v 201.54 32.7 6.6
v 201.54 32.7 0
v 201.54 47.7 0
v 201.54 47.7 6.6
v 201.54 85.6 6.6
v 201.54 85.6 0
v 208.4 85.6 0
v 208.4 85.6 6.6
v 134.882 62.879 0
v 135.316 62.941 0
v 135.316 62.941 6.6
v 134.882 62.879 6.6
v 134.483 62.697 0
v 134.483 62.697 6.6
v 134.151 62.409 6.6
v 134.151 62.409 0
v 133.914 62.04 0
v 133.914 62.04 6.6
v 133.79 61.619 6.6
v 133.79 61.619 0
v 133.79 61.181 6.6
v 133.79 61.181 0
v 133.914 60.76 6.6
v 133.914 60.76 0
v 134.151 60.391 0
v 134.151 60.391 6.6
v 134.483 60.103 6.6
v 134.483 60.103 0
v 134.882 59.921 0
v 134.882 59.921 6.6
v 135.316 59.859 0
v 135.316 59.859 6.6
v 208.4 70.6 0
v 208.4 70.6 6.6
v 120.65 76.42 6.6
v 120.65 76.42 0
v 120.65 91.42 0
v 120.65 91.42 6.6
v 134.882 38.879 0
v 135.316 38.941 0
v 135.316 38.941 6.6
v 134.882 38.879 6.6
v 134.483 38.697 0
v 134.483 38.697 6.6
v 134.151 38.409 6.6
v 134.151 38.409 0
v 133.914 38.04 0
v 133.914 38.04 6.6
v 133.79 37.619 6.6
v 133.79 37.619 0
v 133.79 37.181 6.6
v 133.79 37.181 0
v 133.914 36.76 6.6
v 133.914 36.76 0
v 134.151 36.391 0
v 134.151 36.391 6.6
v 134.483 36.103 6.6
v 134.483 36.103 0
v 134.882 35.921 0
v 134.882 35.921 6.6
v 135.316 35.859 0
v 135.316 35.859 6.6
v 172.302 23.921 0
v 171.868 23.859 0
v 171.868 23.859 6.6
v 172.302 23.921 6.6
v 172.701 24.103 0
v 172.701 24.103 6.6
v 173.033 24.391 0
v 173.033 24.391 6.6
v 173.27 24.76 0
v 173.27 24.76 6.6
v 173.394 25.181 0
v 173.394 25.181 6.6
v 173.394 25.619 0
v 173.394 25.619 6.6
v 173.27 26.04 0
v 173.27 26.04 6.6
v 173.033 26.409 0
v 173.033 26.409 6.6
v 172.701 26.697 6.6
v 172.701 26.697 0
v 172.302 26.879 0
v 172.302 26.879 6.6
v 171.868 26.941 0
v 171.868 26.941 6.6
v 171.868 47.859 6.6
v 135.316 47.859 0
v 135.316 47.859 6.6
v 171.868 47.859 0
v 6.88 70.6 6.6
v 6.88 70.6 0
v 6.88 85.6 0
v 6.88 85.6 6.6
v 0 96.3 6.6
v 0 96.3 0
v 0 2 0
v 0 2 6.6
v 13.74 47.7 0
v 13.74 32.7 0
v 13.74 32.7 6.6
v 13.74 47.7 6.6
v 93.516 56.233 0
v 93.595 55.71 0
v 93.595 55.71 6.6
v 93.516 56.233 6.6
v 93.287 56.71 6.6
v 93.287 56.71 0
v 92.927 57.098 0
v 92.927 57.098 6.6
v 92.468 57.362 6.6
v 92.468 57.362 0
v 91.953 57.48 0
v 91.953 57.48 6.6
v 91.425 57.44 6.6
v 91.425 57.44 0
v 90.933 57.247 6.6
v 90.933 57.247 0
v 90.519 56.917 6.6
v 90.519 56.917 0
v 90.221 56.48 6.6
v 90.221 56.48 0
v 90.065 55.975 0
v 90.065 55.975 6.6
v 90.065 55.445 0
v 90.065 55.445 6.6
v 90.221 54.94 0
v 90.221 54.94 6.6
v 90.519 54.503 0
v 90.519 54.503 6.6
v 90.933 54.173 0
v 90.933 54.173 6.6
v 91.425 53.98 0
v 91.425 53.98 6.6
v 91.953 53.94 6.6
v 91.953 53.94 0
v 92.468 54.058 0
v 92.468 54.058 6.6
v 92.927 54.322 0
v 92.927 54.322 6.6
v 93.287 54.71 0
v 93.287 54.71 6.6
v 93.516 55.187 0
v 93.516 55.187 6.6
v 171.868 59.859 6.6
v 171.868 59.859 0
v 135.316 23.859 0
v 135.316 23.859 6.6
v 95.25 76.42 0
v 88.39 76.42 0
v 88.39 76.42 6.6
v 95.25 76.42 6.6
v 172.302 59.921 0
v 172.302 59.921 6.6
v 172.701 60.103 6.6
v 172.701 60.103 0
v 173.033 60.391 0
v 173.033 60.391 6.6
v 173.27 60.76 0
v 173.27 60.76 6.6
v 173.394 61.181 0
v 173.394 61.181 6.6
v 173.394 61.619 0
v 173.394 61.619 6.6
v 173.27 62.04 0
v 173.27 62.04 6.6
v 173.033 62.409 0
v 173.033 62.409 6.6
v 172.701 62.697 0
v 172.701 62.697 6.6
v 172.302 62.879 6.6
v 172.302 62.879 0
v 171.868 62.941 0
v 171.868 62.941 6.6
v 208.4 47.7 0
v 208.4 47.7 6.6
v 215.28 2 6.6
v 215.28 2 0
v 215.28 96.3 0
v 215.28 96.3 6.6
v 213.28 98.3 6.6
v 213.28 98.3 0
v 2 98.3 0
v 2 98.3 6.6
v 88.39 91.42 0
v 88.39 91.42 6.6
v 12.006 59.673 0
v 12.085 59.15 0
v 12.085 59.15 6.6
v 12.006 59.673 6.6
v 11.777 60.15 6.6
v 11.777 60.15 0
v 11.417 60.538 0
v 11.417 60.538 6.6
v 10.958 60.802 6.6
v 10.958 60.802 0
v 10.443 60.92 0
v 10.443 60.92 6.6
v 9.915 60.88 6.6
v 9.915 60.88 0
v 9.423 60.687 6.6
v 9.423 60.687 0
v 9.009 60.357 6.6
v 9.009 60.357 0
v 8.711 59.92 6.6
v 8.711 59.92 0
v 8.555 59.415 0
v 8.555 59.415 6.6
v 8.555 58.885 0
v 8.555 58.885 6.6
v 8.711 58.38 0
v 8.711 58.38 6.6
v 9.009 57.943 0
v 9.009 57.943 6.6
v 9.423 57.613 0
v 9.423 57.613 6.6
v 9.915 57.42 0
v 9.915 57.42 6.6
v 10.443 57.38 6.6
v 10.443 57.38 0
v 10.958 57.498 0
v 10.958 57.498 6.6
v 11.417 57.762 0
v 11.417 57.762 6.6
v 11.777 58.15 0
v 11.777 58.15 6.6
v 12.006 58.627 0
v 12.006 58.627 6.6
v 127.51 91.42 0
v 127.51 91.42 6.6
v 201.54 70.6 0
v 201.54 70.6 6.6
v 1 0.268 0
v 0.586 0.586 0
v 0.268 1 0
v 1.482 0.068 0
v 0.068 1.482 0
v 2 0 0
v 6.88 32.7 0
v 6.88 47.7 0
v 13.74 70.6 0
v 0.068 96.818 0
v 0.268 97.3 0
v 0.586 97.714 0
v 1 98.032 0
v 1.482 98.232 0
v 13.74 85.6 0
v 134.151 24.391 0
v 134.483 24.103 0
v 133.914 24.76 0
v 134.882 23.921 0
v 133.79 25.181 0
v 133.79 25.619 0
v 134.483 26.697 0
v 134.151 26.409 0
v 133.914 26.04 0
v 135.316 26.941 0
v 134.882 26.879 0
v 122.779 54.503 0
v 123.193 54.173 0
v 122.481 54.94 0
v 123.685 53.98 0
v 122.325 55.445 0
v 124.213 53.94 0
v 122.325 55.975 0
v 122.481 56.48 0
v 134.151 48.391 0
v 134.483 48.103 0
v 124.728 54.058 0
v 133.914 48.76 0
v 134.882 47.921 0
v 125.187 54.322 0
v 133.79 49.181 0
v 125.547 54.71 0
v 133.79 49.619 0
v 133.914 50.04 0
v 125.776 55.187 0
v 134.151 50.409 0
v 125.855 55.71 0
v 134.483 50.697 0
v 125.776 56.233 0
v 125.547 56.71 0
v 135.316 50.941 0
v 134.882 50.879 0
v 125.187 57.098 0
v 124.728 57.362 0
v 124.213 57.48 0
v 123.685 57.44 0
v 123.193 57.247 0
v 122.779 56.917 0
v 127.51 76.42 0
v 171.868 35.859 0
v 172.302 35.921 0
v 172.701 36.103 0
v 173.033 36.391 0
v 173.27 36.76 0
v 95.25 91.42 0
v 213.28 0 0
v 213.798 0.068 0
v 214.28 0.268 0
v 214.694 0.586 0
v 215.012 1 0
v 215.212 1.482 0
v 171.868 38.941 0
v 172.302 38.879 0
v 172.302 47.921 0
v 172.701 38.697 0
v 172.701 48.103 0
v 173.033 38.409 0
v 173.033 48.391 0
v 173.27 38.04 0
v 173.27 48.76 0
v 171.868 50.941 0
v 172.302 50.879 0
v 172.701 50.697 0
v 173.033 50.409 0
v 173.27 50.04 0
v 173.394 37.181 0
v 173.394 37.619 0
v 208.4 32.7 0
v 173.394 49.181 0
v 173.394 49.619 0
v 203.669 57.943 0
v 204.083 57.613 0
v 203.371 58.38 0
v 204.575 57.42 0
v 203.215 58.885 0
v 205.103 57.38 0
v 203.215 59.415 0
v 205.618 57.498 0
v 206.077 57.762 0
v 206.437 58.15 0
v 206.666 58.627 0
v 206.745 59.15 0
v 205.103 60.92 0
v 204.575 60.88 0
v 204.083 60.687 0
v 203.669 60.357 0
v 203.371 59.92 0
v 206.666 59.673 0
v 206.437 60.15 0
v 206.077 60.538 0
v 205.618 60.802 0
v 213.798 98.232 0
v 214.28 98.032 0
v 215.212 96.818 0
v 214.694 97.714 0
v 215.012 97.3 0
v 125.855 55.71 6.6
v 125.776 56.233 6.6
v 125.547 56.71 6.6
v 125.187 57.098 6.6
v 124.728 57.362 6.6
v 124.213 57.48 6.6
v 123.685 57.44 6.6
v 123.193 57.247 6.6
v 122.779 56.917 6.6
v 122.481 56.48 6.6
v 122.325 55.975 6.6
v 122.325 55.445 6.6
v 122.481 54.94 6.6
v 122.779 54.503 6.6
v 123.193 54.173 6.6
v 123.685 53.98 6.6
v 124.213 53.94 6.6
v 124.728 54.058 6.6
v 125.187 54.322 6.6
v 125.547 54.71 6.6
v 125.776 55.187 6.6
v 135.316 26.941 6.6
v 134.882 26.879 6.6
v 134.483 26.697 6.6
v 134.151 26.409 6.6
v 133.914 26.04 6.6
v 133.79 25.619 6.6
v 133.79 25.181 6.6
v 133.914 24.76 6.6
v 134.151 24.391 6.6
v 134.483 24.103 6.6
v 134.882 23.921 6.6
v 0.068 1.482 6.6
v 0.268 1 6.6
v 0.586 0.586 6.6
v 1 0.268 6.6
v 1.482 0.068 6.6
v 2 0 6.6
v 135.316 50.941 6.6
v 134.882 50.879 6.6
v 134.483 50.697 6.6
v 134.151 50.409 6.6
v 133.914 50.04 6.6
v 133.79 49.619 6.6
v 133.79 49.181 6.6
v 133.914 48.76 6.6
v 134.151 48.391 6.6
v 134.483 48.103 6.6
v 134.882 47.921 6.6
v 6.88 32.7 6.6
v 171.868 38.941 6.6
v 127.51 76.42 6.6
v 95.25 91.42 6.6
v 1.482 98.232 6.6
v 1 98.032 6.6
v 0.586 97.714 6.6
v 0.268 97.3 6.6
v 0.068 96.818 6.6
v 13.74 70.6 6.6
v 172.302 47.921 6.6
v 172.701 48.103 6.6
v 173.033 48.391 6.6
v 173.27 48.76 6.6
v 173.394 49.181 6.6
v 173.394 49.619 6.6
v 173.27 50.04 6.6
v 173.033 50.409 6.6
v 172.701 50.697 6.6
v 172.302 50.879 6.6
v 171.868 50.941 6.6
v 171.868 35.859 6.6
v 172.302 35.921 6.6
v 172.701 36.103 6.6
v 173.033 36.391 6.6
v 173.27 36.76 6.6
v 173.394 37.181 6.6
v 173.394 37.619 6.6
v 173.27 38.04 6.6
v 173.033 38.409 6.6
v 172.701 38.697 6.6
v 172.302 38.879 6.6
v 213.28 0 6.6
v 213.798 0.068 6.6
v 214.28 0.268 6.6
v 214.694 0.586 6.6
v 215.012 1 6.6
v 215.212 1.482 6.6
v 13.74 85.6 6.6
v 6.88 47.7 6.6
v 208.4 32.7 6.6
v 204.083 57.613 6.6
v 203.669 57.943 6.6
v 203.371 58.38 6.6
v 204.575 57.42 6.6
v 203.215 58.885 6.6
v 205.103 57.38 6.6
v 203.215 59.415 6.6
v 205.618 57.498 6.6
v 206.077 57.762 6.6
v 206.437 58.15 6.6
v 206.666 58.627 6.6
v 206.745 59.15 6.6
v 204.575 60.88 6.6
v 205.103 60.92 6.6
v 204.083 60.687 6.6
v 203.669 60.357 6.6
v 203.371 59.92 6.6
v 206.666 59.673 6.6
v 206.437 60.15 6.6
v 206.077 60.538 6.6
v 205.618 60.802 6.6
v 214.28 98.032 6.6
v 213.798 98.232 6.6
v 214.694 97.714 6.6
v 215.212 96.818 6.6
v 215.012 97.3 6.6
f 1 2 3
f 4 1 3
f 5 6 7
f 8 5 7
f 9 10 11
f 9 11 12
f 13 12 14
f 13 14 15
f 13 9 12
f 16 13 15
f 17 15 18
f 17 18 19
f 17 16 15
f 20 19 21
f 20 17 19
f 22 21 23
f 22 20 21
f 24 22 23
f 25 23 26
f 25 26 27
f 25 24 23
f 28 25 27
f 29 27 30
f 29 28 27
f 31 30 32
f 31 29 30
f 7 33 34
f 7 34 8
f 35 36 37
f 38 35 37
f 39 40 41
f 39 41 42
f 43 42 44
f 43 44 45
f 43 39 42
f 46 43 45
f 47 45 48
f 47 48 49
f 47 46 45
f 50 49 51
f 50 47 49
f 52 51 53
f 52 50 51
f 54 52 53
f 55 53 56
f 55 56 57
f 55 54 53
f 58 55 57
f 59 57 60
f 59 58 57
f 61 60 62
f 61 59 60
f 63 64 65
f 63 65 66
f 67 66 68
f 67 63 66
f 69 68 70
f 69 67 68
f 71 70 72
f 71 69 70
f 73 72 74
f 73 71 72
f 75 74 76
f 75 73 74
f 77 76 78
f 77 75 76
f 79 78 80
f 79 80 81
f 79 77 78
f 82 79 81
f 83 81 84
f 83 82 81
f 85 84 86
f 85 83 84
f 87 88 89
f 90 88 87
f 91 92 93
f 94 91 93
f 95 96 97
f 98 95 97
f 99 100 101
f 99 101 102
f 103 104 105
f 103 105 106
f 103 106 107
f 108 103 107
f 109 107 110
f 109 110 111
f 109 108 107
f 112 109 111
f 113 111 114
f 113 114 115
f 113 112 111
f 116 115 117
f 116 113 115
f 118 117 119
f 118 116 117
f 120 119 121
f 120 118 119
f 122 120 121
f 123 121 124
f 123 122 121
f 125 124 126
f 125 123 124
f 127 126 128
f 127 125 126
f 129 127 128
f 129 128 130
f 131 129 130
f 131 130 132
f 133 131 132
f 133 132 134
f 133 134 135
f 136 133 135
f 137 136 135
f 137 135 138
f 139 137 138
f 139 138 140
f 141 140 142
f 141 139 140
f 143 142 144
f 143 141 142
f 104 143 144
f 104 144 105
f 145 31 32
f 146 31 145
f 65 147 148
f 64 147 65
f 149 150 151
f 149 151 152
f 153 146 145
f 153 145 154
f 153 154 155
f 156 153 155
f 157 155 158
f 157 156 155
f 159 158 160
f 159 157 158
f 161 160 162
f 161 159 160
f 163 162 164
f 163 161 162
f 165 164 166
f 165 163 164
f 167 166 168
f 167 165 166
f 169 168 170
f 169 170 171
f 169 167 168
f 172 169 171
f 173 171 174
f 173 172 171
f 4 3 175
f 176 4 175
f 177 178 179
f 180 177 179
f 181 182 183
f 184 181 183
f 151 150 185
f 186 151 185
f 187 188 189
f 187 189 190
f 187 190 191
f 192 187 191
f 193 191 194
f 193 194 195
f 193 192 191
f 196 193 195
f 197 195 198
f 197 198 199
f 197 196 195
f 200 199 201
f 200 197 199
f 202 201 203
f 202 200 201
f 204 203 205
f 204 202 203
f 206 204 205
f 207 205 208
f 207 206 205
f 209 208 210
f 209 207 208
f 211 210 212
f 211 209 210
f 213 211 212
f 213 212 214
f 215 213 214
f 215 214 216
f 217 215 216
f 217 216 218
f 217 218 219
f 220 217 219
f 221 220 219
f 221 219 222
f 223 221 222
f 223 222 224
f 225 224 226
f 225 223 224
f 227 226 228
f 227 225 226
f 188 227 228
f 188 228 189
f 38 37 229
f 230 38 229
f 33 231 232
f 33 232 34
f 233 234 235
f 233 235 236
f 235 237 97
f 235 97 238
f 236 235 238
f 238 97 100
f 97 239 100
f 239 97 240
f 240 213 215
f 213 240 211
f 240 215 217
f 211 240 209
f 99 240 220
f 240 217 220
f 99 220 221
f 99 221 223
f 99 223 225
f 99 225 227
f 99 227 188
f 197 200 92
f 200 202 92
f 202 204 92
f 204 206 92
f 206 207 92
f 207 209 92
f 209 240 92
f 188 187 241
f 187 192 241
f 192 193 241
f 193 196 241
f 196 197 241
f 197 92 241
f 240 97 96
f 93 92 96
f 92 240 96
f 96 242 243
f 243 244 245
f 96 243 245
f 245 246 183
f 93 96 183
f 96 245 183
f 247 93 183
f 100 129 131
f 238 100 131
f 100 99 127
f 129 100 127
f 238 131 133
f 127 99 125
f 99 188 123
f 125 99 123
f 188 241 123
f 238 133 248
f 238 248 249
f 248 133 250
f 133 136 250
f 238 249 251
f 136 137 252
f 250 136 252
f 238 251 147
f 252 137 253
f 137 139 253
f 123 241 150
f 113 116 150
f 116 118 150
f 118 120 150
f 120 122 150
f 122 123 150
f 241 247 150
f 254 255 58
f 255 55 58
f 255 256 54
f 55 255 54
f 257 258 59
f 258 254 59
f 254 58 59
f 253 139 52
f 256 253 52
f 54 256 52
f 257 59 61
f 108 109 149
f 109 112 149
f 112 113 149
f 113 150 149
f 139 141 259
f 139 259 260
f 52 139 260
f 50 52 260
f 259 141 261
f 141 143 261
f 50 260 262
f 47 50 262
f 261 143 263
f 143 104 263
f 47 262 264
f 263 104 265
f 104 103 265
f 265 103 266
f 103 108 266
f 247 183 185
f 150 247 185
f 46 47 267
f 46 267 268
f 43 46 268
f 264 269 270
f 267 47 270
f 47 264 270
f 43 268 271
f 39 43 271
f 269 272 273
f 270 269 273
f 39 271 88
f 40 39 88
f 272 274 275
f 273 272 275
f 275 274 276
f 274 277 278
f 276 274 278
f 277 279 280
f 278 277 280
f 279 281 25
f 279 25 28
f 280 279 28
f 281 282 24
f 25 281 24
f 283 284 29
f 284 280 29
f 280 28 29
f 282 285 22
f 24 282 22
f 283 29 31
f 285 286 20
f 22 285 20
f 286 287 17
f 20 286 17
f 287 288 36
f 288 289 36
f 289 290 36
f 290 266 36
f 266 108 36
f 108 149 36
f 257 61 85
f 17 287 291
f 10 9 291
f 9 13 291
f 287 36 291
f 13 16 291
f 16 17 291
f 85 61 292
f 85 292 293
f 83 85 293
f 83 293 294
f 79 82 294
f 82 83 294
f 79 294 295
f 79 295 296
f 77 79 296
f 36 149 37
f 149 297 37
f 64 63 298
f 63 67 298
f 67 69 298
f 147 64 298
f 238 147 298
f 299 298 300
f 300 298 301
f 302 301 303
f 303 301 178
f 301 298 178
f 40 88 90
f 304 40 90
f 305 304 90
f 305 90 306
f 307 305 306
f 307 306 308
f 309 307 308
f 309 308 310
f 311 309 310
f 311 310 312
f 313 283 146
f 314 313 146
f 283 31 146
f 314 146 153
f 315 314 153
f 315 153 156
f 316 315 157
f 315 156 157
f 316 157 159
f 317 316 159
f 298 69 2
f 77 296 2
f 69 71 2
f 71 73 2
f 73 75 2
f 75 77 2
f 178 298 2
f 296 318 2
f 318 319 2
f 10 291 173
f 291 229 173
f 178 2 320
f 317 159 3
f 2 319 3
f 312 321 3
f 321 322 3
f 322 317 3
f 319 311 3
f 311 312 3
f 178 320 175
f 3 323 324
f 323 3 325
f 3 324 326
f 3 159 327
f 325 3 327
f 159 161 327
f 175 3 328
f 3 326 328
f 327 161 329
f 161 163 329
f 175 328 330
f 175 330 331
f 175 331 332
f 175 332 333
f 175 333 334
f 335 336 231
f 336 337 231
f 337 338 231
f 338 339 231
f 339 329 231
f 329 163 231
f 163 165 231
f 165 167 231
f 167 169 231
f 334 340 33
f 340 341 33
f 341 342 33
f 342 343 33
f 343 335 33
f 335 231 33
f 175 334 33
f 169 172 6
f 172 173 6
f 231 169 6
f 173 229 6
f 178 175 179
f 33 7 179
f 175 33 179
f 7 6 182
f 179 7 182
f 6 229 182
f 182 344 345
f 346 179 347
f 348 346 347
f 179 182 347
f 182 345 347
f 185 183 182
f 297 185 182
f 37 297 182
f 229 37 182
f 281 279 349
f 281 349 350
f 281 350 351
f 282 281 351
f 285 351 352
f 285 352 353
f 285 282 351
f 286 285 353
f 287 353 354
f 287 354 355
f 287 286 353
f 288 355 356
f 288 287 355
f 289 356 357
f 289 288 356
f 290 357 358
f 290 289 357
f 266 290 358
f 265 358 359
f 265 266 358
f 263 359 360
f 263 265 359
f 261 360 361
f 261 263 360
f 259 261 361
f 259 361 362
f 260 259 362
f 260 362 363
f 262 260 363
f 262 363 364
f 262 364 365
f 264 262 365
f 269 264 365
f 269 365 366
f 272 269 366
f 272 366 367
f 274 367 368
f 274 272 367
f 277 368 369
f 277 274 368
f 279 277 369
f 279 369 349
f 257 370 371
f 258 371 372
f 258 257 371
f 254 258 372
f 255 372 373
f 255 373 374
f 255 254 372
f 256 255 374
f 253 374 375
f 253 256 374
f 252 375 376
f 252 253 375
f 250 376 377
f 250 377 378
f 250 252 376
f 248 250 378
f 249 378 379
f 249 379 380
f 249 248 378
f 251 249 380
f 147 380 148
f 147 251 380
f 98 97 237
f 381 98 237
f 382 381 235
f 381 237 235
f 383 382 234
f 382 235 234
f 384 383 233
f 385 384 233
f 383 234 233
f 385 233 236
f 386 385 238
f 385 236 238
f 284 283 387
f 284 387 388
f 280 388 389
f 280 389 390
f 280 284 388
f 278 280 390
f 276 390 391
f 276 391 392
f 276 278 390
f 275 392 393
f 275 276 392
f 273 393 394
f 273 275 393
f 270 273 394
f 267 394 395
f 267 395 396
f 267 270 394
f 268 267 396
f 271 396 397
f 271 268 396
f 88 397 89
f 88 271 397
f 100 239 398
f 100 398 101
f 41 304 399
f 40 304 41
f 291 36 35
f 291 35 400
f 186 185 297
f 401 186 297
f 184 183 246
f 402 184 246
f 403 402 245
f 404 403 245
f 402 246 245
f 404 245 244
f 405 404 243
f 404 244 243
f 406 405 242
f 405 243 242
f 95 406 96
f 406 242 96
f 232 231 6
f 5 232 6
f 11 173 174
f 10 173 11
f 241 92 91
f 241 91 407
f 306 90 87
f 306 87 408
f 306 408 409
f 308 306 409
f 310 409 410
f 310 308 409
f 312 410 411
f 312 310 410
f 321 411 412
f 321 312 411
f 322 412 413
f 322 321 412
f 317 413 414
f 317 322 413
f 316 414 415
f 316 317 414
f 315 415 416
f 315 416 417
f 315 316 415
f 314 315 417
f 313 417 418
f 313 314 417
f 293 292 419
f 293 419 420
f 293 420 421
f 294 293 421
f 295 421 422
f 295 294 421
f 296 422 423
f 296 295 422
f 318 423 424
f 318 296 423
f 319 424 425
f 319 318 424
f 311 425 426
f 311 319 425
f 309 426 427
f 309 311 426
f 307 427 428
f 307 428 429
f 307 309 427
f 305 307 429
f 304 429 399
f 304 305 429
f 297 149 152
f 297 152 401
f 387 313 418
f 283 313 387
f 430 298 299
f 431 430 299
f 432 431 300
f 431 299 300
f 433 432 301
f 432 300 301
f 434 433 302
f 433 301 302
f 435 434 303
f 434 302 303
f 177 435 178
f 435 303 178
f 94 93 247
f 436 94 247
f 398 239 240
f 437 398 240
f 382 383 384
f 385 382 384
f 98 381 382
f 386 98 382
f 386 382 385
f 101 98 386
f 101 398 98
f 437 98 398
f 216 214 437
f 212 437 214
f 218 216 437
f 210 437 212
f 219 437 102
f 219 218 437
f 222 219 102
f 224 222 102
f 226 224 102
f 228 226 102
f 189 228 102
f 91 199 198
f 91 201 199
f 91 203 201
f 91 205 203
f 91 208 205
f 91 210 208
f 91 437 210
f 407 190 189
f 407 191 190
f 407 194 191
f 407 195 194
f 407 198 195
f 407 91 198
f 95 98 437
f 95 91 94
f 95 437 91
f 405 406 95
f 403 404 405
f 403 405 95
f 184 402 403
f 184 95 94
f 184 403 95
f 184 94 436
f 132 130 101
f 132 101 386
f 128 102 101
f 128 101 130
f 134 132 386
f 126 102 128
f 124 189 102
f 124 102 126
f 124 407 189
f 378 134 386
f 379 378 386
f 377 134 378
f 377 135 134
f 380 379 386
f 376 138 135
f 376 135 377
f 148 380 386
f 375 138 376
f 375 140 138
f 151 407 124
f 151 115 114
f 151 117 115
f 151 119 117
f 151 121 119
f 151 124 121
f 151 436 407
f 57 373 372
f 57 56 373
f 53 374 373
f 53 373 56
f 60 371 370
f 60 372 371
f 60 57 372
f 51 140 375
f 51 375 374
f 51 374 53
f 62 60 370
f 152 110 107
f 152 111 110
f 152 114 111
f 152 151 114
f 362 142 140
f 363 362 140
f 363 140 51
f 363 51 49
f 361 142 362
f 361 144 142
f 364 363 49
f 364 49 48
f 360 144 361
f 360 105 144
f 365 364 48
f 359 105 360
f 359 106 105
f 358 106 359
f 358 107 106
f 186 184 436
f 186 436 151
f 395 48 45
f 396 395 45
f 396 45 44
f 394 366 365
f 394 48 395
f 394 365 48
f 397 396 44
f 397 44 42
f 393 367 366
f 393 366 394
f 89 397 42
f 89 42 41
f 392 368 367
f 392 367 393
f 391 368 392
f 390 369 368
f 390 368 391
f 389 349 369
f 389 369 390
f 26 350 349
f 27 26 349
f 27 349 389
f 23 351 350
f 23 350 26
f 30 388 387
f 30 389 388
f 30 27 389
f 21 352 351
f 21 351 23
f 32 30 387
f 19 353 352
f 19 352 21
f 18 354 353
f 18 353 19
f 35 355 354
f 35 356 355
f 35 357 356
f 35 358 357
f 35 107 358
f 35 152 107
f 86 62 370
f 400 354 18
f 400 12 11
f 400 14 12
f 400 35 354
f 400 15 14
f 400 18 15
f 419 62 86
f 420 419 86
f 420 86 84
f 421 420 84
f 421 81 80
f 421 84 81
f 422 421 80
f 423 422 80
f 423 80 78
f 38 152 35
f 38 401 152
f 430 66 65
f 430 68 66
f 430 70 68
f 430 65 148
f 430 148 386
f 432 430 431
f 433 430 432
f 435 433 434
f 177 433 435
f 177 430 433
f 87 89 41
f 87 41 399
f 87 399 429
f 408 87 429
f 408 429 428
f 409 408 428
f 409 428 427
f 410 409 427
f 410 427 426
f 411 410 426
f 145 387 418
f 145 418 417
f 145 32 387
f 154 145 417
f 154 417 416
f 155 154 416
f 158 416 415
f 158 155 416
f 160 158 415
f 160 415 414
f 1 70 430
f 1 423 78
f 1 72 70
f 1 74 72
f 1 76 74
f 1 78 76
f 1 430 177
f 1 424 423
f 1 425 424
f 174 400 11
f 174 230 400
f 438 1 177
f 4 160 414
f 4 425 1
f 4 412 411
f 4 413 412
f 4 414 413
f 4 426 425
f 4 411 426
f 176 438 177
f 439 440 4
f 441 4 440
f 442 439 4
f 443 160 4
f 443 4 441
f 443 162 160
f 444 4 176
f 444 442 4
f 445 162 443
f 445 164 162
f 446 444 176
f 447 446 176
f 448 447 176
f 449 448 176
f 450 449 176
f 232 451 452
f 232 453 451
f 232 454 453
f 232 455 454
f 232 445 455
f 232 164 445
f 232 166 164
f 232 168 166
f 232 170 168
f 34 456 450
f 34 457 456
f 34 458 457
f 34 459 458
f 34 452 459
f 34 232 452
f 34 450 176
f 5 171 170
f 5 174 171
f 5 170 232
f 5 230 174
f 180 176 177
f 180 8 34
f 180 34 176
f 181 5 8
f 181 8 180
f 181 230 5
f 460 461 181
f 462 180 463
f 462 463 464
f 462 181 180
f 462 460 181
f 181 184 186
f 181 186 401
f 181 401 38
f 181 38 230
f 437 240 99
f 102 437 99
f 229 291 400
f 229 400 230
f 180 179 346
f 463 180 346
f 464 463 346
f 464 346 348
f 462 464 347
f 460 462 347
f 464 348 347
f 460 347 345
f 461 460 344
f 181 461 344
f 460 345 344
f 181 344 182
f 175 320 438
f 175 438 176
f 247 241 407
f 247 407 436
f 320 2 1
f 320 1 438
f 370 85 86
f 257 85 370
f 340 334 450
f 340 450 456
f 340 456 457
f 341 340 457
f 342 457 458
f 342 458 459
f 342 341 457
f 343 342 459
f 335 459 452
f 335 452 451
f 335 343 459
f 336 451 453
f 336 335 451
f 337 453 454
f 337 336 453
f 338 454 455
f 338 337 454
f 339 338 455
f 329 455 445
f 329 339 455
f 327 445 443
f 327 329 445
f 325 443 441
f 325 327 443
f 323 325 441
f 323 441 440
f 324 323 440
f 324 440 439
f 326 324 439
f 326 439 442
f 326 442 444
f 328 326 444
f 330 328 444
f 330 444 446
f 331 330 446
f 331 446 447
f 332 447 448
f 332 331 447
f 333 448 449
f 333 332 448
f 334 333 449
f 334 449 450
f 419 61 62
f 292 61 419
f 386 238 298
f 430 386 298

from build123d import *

# Parameters (mm, degrees)
MODEL_R             = 1.775
MODEL_W             = 6.86
MODEL_H             = 15
BOSS_EXTRUDE1_DEPTH = 6.6


with BuildPart() as part:
    # Model → Boss-Extrude1 (new body)
    with BuildSketch(Plane.XY):
        with BuildLine():
            Line((213.28, 98.3), (2, 98.3))
            ThreePointArc((2, 98.3), (0.585786438, 97.714213562), (0, 96.3))
            Line((0, 96.3), (0, 2))
            ThreePointArc((0, 2), (0.585786438, 0.585786438), (2, 0))
            Line((2, 0), (213.28, 0))
            ThreePointArc((213.28, 0), (214.694213562, 0.585786438), (215.28, 2))
            Line((215.28, 2), (215.28, 96.3))
            ThreePointArc((215.28, 96.3), (214.694213562, 97.714213562), (213.28, 98.3))
        make_face()
        with Locations((10.310000096, 59.15)):
            Circle(MODEL_R, mode=Mode.SUBTRACT)
        with Locations((204.970000096, 59.15)):
            Circle(MODEL_R, mode=Mode.SUBTRACT)
        with Locations((91.820001761, 55.71)):
            Circle(MODEL_R, mode=Mode.SUBTRACT)
        with Locations((124.08000176, 55.71)):
            Circle(MODEL_R, mode=Mode.SUBTRACT)
        with BuildLine():
            Line((135.316050952, 59.858691011), (171.867952568, 59.858691011))
            ThreePointArc((171.867952568, 59.858691011), (173.409261558, 61.4), (171.867952568, 62.941308989))
            Line((171.867952568, 62.941308989), (135.316050952, 62.941308989))
            ThreePointArc((135.316050952, 62.941308989), (133.774741963, 61.4), (135.316050952, 59.858691011))
        make_face(mode=Mode.SUBTRACT)
        with BuildLine():
            Line((135.316050952, 47.858691011), (171.867952568, 47.858691011))
            ThreePointArc((171.867952568, 47.858691011), (173.409261558, 49.4), (171.867952568, 50.941308989))
            Line((171.867952568, 50.941308989), (135.316050952, 50.941308989))
            ThreePointArc((135.316050952, 50.941308989), (133.774741963, 49.4), (135.316050952, 47.858691011))
        make_face(mode=Mode.SUBTRACT)
        with Locations((91.820001761, 83.92)):
            Rectangle(MODEL_W, MODEL_H, mode=Mode.SUBTRACT)
        with Locations((124.08000176, 83.92)):
            Rectangle(MODEL_W, MODEL_H, mode=Mode.SUBTRACT)
        with Locations((204.970000096, 40.2)):
            Rectangle(MODEL_W, MODEL_H, mode=Mode.SUBTRACT)
        with Locations((204.970000096, 78.1)):
            Rectangle(MODEL_W, MODEL_H, mode=Mode.SUBTRACT)
        with Locations((10.310000096, 40.2)):
            Rectangle(MODEL_W, MODEL_H, mode=Mode.SUBTRACT)
        with Locations((10.310000096, 78.1)):
            Rectangle(MODEL_W, MODEL_H, mode=Mode.SUBTRACT)
        with BuildLine():
            Line((171.867952568, 26.941308989), (135.316050952, 26.941308989))
            ThreePointArc((135.316050952, 26.941308989), (133.774741963, 25.4), (135.316050952, 23.858691011))
            Line((135.316050952, 23.858691011), (171.867952568, 23.858691011))
            ThreePointArc((171.867952568, 23.858691011), (173.409261558, 25.4), (171.867952568, 26.941308989))
        make_face(mode=Mode.SUBTRACT)
        with BuildLine():
            Line((171.867952568, 38.941308989), (135.316050952, 38.941308989))
            ThreePointArc((135.316050952, 38.941308989), (133.774741963, 37.4), (135.316050952, 35.858691011))
            Line((135.316050952, 35.858691011), (171.867952568, 35.858691011))
            ThreePointArc((171.867952568, 35.858691011), (173.409261558, 37.4), (171.867952568, 38.941308989))
        make_face(mode=Mode.SUBTRACT)
    extrude(amount=BOSS_EXTRUDE1_DEPTH)


solid = part.part
